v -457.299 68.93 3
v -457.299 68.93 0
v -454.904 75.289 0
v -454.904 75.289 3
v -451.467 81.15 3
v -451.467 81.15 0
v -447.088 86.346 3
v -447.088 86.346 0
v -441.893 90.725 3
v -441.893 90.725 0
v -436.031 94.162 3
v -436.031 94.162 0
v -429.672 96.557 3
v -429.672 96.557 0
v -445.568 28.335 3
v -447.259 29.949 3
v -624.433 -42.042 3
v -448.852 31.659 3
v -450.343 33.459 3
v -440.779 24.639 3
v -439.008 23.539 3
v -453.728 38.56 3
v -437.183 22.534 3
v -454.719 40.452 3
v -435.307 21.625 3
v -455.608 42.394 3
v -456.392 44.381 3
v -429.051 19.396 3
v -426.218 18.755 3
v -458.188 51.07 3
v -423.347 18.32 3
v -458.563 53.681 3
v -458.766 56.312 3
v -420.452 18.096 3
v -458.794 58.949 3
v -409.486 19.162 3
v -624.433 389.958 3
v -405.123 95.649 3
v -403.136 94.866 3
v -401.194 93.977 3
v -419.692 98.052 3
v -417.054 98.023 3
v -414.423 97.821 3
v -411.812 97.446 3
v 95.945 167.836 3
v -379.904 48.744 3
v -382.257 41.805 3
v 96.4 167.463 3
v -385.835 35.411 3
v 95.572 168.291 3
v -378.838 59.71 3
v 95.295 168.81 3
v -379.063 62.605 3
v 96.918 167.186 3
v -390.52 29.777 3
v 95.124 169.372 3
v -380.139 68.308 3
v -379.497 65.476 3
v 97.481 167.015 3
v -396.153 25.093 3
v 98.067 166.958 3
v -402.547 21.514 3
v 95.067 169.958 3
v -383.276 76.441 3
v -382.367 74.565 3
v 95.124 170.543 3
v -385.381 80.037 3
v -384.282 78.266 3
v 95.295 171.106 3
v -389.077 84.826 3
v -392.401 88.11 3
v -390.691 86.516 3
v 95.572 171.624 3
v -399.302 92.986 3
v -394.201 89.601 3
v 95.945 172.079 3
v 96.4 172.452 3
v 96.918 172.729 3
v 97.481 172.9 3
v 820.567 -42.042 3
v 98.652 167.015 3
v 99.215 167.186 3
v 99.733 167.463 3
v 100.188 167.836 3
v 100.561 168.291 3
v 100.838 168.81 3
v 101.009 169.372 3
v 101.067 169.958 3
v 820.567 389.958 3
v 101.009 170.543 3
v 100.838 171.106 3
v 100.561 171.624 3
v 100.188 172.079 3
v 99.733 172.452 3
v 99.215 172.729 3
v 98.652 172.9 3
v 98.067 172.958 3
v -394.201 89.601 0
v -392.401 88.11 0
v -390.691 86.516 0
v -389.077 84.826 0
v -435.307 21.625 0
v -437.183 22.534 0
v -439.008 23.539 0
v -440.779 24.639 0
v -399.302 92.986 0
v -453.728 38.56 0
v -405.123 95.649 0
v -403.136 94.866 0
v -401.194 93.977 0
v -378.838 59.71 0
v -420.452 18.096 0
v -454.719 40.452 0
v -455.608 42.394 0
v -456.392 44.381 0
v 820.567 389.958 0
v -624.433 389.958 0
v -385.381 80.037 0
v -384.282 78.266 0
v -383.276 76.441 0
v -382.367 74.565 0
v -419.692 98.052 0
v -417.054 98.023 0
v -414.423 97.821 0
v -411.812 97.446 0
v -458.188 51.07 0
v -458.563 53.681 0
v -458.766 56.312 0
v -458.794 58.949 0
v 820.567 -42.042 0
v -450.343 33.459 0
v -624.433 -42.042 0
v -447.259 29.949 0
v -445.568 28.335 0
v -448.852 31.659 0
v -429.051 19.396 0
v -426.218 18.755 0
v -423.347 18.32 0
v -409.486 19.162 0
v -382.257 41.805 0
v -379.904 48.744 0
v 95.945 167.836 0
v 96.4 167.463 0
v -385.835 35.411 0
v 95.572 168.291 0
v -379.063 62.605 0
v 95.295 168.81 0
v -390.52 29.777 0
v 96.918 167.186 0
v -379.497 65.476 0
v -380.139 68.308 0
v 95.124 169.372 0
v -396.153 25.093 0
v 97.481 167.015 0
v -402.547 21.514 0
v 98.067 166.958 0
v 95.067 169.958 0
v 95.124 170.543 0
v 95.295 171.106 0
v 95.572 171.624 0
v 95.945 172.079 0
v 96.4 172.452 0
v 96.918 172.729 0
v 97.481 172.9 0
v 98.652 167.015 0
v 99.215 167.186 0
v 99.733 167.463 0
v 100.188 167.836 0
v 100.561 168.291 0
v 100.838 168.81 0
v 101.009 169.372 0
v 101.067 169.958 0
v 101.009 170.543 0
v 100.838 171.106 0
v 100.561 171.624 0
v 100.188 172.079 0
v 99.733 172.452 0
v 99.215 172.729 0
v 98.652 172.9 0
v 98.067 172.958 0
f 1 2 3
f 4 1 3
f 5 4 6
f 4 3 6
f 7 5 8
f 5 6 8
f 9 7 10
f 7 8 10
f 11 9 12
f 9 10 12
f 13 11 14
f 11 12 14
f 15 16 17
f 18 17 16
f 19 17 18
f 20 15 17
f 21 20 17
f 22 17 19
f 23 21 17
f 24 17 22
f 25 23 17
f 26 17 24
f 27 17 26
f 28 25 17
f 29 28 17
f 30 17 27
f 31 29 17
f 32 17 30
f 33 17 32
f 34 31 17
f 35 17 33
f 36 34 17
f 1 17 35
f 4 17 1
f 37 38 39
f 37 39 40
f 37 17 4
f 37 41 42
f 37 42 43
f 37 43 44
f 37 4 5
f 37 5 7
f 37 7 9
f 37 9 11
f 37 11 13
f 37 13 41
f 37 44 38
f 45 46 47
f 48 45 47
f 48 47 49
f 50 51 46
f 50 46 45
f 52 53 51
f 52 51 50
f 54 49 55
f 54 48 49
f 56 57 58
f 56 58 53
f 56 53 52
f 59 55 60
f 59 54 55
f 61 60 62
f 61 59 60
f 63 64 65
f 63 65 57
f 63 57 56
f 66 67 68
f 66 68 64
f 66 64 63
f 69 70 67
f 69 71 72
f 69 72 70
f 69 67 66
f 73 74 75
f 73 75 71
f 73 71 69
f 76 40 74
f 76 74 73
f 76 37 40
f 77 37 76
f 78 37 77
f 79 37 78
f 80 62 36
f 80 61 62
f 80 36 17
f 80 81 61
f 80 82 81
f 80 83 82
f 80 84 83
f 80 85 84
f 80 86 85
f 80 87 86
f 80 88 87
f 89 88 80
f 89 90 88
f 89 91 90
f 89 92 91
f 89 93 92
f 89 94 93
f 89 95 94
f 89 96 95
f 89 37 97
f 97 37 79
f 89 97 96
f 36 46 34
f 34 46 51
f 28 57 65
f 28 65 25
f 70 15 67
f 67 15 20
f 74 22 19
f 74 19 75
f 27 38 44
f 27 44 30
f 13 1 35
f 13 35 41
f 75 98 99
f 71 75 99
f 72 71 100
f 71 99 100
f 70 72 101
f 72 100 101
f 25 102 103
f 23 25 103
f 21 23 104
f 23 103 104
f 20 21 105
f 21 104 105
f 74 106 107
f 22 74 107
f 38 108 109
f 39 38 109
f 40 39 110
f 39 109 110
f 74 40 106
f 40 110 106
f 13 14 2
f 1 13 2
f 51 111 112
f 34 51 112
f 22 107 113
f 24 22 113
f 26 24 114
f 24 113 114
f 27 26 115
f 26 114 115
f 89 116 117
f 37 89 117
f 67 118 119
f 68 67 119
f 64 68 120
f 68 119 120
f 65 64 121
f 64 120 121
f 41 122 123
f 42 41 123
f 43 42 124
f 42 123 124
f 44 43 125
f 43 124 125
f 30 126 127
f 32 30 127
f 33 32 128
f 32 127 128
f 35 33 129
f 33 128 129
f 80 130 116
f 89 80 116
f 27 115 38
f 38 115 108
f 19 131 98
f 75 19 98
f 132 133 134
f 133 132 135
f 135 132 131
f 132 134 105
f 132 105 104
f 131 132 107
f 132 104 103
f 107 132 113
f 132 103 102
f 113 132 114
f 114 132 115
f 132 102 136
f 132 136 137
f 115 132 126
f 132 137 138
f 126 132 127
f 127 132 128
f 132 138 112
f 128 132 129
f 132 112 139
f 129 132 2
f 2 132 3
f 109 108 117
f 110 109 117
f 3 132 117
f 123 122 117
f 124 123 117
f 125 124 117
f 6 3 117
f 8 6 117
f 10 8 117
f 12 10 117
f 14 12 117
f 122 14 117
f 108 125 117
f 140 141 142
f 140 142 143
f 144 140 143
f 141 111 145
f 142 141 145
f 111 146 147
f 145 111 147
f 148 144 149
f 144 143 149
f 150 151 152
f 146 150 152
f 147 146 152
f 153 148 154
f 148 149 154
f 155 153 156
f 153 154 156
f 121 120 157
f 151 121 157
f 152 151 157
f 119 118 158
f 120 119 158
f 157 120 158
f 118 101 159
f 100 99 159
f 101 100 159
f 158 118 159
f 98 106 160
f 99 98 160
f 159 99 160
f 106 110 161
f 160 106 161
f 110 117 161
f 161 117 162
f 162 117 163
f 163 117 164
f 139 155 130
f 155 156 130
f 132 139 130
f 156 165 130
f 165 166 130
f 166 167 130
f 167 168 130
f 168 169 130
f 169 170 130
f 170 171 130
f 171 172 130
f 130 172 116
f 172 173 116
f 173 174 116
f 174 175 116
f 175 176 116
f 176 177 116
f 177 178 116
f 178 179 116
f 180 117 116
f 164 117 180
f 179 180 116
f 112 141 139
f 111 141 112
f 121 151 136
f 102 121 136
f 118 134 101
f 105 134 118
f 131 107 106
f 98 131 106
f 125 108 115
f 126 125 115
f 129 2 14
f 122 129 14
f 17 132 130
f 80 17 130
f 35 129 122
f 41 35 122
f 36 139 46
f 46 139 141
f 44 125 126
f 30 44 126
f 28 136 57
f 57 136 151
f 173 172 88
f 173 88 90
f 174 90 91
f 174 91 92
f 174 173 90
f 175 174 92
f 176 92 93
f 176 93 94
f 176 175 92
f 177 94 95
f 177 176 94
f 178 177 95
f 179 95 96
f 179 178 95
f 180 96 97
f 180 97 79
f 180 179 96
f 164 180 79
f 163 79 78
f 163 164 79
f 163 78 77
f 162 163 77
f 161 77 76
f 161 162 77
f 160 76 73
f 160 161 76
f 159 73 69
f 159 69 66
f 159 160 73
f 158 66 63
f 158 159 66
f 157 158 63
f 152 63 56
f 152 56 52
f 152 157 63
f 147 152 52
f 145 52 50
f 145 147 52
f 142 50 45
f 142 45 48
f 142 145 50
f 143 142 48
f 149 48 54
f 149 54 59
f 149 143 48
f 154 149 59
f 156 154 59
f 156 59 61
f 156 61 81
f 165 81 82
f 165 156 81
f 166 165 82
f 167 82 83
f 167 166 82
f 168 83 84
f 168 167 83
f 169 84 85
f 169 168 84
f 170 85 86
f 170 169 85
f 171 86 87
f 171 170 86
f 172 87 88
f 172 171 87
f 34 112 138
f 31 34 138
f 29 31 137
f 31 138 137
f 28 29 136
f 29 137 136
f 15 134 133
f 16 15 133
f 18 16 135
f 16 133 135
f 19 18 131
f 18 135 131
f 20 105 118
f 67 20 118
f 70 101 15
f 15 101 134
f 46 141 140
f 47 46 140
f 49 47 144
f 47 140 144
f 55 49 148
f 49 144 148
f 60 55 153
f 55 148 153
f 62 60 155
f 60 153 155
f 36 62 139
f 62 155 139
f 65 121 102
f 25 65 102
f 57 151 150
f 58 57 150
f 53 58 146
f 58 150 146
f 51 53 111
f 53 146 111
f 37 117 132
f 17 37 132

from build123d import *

# Parameters (mm, degrees)
F0_R     = 3
F1_DEPTH = 3


with BuildPart() as f1:
    # F0 (on Top) → F1 (new body)
    with BuildSketch(Plane.XY):
        Polygon((-624.433465, 389.957689), (-624.433465, -42.042311), (-157.433465, -42.042311), (353.566535, -42.042311), (820.566535, -42.042311), (820.566535, 389.957689), (353.566535, 389.957689), (-157.433465, 389.957689), align=None)
        with BuildLine():
            ThreePointArc((-379.90432, 48.743652), (-390.519598, 29.777375), (-409.485875, 19.162095))
            Line((-409.485875, 19.162095), (-379.90432, 48.743652))
        make_face(mode=Mode.SUBTRACT)
        with BuildLine():
            ThreePointArc((-420.451857, 18.095607), (-424.786685, 18.511601), (-429.050602, 19.396356))
            Line((-429.050602, 19.396356), (-380.138584, 68.30838))
            ThreePointArc((-380.138584, 68.30838), (-379.253828, 64.044462), (-378.837833, 59.709635))
            Line((-378.837833, 59.709635), (-420.451857, 18.095607))
        make_face(mode=Mode.SUBTRACT)
        with BuildLine():
            ThreePointArc((-435.307332, 21.624908), (-438.102034, 23.024794), (-440.778896, 24.638625))
            Line((-440.778896, 24.638625), (-385.380853, 80.036673))
            ThreePointArc((-385.380853, 80.036673), (-383.767022, 77.359811), (-382.367136, 74.565109))
            Line((-382.367136, 74.565109), (-435.307332, 21.624908))
        make_face(mode=Mode.SUBTRACT)
        with BuildLine():
            ThreePointArc((-445.567967, 28.334836), (-448.0679, 30.79231), (-450.34307, 33.459228))
            Line((-450.34307, 33.459228), (-394.201457, 89.600846))
            ThreePointArc((-394.201457, 89.600846), (-391.534539, 87.325676), (-389.077064, 84.825743))
            Line((-389.077064, 84.825743), (-445.567967, 28.334836))
        make_face(mode=Mode.SUBTRACT)
        with BuildLine():
            ThreePointArc((-453.727767, 38.559812), (-455.17638, 41.417109), (-456.391695, 44.381166))
            Line((-456.391695, 44.381166), (-405.123396, 95.64947))
            ThreePointArc((-405.123396, 95.64947), (-402.159338, 94.434155), (-399.302041, 92.985543))
            Line((-399.302041, 92.985543), (-453.727767, 38.559812))
        make_face(mode=Mode.SUBTRACT)
        with BuildLine():
            ThreePointArc((-458.1881, 51.070042), (-458.686122, 54.994724), (-458.794018, 58.949406))
            Line((-458.794018, 58.949406), (-419.691636, 98.051792))
            ThreePointArc((-419.691636, 98.051792), (-415.736954, 97.943896), (-411.812272, 97.445874))
            Line((-411.812272, 97.445874), (-458.1881, 51.070042))
        make_face(mode=Mode.SUBTRACT)
        with BuildLine():
            Line((-429.67175, 96.556959), (-457.299186, 68.92952))
            ThreePointArc((-457.299186, 68.92952), (-447.088143, 86.345914), (-429.67175, 96.556959))
        make_face(mode=Mode.SUBTRACT)
        with Locations((98.066535, 169.957689)):
            Circle(F0_R, mode=Mode.SUBTRACT)
    extrude(amount=F1_DEPTH)


solid = f1.part
